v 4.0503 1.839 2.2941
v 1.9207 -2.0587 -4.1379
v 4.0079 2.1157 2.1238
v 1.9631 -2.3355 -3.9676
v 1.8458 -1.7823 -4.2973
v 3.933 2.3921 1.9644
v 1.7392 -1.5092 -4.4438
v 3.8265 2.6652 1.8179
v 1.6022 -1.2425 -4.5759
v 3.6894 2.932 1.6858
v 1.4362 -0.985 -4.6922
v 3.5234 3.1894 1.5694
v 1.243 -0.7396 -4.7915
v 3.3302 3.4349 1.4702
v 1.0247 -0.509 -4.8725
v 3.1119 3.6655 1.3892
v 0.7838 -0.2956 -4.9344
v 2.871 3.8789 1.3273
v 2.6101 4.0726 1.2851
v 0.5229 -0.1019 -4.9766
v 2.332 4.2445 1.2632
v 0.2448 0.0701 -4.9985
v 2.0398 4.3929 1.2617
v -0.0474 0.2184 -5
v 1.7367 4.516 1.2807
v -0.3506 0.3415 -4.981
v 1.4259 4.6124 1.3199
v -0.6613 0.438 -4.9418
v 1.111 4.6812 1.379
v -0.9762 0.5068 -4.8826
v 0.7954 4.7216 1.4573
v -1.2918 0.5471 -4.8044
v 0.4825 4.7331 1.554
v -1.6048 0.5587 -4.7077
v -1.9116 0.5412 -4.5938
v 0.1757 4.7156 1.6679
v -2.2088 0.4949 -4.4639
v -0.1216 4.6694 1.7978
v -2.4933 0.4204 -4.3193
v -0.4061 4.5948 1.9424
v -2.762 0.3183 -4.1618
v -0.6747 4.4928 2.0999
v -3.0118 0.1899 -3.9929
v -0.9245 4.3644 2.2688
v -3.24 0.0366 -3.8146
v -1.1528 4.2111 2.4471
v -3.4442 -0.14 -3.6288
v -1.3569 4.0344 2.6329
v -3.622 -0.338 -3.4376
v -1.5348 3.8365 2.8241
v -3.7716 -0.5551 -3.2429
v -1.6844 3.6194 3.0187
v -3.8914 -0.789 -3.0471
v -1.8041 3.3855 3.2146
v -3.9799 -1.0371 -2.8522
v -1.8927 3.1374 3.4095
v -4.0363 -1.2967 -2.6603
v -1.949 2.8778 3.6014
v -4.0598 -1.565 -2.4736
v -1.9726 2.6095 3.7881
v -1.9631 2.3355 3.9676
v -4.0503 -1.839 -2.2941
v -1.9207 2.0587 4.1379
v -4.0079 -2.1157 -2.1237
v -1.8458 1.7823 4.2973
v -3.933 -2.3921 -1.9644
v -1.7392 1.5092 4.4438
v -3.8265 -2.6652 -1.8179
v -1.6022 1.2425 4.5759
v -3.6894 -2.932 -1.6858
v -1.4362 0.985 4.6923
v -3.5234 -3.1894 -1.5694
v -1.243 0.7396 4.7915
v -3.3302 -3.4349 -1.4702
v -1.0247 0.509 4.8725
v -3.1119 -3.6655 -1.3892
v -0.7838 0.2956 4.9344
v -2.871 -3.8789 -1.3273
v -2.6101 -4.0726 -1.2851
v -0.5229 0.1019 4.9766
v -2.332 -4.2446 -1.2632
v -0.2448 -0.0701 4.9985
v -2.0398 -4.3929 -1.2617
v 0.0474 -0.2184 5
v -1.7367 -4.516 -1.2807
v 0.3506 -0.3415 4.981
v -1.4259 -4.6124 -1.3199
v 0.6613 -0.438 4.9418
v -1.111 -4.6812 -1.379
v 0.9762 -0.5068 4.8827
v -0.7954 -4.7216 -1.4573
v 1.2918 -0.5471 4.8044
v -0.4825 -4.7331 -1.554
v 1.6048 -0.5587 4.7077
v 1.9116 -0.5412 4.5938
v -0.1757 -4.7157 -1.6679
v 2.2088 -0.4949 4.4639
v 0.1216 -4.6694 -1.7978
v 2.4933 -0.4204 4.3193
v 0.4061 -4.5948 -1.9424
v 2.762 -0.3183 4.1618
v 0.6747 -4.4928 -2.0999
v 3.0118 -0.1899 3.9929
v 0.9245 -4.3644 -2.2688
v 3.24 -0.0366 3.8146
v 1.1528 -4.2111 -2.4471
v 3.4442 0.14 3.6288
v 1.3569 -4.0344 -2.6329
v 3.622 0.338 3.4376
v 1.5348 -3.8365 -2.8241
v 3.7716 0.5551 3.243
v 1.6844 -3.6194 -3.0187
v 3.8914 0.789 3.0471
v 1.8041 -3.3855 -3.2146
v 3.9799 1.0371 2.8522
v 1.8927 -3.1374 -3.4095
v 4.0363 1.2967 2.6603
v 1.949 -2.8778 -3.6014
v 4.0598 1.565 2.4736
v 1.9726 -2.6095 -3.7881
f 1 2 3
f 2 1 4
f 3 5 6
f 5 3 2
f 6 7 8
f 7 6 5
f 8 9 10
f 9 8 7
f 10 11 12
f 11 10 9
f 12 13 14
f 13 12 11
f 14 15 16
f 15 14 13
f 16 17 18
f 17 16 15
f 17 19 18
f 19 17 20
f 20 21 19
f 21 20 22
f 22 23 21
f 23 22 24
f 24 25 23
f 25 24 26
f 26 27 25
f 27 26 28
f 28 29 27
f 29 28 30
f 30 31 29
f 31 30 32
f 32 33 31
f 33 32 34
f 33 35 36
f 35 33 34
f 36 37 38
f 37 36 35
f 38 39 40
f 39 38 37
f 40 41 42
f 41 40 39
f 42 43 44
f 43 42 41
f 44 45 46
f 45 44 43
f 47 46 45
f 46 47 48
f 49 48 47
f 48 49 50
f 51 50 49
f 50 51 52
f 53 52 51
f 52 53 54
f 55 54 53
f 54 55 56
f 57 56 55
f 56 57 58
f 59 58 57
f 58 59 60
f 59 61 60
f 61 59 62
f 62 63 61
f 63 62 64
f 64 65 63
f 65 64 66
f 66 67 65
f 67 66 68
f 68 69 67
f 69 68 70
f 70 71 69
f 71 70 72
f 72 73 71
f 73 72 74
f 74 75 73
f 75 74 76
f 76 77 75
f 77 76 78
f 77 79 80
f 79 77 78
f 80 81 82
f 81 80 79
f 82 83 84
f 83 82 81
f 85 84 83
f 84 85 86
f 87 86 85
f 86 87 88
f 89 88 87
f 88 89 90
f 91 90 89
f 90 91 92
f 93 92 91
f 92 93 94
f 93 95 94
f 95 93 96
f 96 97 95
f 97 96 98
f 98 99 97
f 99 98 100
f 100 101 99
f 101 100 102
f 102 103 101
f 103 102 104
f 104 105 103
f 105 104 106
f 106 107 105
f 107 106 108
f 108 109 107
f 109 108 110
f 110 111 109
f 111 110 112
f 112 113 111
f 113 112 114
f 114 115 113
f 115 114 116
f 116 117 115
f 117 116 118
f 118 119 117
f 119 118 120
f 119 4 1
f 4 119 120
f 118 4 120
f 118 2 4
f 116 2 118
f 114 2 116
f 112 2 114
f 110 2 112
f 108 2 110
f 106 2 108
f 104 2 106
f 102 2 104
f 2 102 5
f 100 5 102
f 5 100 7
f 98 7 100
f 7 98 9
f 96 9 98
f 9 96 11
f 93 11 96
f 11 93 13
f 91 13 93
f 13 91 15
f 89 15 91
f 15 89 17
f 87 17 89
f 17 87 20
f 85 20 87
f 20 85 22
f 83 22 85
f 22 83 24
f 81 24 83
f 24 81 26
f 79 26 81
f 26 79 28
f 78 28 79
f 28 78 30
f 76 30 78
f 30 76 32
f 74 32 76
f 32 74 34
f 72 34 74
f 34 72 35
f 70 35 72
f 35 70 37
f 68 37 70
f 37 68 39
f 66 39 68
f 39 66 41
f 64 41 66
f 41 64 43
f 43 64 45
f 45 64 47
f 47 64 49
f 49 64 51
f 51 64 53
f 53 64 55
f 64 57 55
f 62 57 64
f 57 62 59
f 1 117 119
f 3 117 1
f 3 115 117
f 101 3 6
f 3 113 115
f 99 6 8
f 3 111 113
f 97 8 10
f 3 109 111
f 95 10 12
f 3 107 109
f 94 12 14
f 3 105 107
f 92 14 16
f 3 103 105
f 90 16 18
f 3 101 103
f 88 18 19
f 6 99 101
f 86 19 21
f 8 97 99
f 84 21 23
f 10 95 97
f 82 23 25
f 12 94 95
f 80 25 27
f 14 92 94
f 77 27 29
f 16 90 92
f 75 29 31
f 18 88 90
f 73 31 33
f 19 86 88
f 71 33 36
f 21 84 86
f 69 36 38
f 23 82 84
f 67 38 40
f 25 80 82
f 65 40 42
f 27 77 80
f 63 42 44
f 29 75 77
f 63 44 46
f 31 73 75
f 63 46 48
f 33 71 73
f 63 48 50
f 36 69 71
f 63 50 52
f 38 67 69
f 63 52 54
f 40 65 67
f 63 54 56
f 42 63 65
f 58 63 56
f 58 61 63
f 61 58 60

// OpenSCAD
translate([-1.043615, 3.130844, -3.130846])
multmatrix(m = [[0.960357, -0.0792865, 0.267261, 0.000000], [-0.0792865, 0.841427, 0.534522, -5.218075], [-0.267261, -0.534522, 0.801784, 0.000000], [0, 0, 0, 1]])
cylinder(h = 7.809705, r1 = 3.130845, r2 = 3.130845, center = false, $fn = 60);
